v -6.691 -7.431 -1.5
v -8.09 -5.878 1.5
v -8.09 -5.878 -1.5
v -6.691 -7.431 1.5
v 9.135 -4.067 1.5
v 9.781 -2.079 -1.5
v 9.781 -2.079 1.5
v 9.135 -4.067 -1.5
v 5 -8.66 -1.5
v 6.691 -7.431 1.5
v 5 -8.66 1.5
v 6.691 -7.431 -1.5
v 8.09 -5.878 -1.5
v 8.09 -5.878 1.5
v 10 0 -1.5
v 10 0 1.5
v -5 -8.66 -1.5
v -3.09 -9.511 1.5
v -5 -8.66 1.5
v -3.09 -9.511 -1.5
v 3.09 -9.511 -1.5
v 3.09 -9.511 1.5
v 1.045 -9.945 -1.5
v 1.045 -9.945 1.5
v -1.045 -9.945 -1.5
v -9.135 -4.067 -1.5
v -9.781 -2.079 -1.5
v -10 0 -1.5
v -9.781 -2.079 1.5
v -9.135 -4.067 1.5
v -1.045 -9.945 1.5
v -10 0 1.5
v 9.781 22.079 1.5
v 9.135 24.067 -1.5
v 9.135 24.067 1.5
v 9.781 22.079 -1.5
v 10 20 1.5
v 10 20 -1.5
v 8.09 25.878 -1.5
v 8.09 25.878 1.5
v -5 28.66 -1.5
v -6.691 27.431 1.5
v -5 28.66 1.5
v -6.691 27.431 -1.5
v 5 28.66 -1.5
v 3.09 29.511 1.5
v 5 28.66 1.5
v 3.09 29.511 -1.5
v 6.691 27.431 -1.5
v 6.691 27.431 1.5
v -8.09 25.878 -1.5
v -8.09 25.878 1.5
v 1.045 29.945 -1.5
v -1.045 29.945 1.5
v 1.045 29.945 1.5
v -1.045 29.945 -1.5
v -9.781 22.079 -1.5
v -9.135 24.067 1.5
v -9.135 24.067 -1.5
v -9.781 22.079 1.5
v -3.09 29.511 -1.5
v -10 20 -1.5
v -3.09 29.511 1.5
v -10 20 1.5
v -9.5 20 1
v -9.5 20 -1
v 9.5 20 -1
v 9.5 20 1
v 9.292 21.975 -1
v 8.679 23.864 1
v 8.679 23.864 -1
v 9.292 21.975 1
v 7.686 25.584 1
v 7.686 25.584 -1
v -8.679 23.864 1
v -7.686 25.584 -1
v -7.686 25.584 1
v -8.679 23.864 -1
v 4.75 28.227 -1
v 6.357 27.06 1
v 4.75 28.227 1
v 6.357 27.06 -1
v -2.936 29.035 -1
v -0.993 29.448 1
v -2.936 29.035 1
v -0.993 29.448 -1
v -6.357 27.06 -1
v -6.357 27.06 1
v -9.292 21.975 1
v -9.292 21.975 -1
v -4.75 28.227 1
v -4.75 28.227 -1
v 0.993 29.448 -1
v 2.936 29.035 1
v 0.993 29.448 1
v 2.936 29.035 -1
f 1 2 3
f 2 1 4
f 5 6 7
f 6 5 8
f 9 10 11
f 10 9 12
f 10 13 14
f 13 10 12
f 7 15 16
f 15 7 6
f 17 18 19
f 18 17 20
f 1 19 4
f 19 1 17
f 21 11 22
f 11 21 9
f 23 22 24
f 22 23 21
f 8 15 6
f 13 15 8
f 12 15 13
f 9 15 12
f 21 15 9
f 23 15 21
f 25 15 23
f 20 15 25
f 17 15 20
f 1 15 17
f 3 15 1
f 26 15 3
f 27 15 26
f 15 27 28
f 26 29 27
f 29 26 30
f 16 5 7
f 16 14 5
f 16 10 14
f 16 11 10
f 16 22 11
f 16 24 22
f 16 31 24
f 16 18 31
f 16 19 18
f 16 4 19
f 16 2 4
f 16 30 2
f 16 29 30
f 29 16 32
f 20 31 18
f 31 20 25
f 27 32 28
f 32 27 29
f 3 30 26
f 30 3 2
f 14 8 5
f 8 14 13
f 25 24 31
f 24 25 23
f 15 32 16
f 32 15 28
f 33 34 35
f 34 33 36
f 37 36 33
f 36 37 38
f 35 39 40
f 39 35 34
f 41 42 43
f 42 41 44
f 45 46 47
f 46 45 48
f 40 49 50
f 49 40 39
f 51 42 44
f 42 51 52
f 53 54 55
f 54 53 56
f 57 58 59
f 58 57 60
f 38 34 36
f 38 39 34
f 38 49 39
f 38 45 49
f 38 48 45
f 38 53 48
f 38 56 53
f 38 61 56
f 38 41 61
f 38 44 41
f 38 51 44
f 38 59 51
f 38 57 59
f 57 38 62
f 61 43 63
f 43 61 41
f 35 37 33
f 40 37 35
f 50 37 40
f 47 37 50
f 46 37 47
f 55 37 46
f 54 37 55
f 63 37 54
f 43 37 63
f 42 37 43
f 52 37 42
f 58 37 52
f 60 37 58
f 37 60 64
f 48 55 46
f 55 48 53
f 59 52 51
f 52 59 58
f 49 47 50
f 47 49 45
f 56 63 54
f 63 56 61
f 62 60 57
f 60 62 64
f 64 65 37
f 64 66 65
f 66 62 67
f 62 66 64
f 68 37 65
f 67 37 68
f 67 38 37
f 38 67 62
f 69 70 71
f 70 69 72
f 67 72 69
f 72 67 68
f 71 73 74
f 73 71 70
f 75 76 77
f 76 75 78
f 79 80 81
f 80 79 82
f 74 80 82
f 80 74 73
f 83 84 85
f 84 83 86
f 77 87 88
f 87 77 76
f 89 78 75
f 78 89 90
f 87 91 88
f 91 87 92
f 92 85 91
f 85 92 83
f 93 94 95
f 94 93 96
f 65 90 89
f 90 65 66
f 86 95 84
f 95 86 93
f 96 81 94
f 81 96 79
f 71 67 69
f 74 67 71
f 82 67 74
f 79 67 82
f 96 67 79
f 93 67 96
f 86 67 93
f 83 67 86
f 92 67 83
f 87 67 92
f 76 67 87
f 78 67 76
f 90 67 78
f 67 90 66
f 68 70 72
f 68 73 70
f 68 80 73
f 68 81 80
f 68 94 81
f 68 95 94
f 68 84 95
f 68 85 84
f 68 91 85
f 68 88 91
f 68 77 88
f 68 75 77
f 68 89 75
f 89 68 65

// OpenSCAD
module rounded_start_segment(width, thickness, wallThickness=0) {
  if (wallThickness > 0) {
    difference () {
      rounded_start_segment(width, thickness);
      rounded_start_segment(width-(2*wallThickness), thickness-(2*wallThickness));
    }
  } else {
    difference () {
      cylinder(h=thickness, r=width/2, center=true);

      translate([0,width/4,0])
        cube([width,width/2,thickness], center=true);
    }
  }
}

module add_rounded_start_segment(width, thickness, wallThickness=0) {
  rounded_start_segment(width, thickness, wallThickness);
  for(i = [0 : $children - 1])
    children(i);
}

module rounded_stop_segment(width, thickness, wallThickness=0) {
  if (wallThickness > 0) {
    difference () {
      rounded_stop_segment(width, thickness);
      rounded_stop_segment(width-(2*wallThickness), thickness-(2*wallThickness));
    }
  } else {
    difference () {
      cylinder(h=thickness, r=width/2, center=true);

      translate([0,-width/4,0])
        cube([width,width/2,thickness], center=true);
    }
  }
}

module add_rounded_stop_segment(width, thickness, wallThickness=0) {
  rounded_stop_segment(width, thickness, wallThickness);
  for(i = [0 : $children - 1])
    children(i);
}

// Testing
echo("##########");
echo("In rounded_segment.scad");
echo("This file should not be included, use ''use <filemane>'' instead.");
echo("##########");

p = 1;
if (p==1) {
  add_rounded_start_segment(20,3)
    translate([0,20,0])
      rounded_stop_segment(20,3,0.5);
}
